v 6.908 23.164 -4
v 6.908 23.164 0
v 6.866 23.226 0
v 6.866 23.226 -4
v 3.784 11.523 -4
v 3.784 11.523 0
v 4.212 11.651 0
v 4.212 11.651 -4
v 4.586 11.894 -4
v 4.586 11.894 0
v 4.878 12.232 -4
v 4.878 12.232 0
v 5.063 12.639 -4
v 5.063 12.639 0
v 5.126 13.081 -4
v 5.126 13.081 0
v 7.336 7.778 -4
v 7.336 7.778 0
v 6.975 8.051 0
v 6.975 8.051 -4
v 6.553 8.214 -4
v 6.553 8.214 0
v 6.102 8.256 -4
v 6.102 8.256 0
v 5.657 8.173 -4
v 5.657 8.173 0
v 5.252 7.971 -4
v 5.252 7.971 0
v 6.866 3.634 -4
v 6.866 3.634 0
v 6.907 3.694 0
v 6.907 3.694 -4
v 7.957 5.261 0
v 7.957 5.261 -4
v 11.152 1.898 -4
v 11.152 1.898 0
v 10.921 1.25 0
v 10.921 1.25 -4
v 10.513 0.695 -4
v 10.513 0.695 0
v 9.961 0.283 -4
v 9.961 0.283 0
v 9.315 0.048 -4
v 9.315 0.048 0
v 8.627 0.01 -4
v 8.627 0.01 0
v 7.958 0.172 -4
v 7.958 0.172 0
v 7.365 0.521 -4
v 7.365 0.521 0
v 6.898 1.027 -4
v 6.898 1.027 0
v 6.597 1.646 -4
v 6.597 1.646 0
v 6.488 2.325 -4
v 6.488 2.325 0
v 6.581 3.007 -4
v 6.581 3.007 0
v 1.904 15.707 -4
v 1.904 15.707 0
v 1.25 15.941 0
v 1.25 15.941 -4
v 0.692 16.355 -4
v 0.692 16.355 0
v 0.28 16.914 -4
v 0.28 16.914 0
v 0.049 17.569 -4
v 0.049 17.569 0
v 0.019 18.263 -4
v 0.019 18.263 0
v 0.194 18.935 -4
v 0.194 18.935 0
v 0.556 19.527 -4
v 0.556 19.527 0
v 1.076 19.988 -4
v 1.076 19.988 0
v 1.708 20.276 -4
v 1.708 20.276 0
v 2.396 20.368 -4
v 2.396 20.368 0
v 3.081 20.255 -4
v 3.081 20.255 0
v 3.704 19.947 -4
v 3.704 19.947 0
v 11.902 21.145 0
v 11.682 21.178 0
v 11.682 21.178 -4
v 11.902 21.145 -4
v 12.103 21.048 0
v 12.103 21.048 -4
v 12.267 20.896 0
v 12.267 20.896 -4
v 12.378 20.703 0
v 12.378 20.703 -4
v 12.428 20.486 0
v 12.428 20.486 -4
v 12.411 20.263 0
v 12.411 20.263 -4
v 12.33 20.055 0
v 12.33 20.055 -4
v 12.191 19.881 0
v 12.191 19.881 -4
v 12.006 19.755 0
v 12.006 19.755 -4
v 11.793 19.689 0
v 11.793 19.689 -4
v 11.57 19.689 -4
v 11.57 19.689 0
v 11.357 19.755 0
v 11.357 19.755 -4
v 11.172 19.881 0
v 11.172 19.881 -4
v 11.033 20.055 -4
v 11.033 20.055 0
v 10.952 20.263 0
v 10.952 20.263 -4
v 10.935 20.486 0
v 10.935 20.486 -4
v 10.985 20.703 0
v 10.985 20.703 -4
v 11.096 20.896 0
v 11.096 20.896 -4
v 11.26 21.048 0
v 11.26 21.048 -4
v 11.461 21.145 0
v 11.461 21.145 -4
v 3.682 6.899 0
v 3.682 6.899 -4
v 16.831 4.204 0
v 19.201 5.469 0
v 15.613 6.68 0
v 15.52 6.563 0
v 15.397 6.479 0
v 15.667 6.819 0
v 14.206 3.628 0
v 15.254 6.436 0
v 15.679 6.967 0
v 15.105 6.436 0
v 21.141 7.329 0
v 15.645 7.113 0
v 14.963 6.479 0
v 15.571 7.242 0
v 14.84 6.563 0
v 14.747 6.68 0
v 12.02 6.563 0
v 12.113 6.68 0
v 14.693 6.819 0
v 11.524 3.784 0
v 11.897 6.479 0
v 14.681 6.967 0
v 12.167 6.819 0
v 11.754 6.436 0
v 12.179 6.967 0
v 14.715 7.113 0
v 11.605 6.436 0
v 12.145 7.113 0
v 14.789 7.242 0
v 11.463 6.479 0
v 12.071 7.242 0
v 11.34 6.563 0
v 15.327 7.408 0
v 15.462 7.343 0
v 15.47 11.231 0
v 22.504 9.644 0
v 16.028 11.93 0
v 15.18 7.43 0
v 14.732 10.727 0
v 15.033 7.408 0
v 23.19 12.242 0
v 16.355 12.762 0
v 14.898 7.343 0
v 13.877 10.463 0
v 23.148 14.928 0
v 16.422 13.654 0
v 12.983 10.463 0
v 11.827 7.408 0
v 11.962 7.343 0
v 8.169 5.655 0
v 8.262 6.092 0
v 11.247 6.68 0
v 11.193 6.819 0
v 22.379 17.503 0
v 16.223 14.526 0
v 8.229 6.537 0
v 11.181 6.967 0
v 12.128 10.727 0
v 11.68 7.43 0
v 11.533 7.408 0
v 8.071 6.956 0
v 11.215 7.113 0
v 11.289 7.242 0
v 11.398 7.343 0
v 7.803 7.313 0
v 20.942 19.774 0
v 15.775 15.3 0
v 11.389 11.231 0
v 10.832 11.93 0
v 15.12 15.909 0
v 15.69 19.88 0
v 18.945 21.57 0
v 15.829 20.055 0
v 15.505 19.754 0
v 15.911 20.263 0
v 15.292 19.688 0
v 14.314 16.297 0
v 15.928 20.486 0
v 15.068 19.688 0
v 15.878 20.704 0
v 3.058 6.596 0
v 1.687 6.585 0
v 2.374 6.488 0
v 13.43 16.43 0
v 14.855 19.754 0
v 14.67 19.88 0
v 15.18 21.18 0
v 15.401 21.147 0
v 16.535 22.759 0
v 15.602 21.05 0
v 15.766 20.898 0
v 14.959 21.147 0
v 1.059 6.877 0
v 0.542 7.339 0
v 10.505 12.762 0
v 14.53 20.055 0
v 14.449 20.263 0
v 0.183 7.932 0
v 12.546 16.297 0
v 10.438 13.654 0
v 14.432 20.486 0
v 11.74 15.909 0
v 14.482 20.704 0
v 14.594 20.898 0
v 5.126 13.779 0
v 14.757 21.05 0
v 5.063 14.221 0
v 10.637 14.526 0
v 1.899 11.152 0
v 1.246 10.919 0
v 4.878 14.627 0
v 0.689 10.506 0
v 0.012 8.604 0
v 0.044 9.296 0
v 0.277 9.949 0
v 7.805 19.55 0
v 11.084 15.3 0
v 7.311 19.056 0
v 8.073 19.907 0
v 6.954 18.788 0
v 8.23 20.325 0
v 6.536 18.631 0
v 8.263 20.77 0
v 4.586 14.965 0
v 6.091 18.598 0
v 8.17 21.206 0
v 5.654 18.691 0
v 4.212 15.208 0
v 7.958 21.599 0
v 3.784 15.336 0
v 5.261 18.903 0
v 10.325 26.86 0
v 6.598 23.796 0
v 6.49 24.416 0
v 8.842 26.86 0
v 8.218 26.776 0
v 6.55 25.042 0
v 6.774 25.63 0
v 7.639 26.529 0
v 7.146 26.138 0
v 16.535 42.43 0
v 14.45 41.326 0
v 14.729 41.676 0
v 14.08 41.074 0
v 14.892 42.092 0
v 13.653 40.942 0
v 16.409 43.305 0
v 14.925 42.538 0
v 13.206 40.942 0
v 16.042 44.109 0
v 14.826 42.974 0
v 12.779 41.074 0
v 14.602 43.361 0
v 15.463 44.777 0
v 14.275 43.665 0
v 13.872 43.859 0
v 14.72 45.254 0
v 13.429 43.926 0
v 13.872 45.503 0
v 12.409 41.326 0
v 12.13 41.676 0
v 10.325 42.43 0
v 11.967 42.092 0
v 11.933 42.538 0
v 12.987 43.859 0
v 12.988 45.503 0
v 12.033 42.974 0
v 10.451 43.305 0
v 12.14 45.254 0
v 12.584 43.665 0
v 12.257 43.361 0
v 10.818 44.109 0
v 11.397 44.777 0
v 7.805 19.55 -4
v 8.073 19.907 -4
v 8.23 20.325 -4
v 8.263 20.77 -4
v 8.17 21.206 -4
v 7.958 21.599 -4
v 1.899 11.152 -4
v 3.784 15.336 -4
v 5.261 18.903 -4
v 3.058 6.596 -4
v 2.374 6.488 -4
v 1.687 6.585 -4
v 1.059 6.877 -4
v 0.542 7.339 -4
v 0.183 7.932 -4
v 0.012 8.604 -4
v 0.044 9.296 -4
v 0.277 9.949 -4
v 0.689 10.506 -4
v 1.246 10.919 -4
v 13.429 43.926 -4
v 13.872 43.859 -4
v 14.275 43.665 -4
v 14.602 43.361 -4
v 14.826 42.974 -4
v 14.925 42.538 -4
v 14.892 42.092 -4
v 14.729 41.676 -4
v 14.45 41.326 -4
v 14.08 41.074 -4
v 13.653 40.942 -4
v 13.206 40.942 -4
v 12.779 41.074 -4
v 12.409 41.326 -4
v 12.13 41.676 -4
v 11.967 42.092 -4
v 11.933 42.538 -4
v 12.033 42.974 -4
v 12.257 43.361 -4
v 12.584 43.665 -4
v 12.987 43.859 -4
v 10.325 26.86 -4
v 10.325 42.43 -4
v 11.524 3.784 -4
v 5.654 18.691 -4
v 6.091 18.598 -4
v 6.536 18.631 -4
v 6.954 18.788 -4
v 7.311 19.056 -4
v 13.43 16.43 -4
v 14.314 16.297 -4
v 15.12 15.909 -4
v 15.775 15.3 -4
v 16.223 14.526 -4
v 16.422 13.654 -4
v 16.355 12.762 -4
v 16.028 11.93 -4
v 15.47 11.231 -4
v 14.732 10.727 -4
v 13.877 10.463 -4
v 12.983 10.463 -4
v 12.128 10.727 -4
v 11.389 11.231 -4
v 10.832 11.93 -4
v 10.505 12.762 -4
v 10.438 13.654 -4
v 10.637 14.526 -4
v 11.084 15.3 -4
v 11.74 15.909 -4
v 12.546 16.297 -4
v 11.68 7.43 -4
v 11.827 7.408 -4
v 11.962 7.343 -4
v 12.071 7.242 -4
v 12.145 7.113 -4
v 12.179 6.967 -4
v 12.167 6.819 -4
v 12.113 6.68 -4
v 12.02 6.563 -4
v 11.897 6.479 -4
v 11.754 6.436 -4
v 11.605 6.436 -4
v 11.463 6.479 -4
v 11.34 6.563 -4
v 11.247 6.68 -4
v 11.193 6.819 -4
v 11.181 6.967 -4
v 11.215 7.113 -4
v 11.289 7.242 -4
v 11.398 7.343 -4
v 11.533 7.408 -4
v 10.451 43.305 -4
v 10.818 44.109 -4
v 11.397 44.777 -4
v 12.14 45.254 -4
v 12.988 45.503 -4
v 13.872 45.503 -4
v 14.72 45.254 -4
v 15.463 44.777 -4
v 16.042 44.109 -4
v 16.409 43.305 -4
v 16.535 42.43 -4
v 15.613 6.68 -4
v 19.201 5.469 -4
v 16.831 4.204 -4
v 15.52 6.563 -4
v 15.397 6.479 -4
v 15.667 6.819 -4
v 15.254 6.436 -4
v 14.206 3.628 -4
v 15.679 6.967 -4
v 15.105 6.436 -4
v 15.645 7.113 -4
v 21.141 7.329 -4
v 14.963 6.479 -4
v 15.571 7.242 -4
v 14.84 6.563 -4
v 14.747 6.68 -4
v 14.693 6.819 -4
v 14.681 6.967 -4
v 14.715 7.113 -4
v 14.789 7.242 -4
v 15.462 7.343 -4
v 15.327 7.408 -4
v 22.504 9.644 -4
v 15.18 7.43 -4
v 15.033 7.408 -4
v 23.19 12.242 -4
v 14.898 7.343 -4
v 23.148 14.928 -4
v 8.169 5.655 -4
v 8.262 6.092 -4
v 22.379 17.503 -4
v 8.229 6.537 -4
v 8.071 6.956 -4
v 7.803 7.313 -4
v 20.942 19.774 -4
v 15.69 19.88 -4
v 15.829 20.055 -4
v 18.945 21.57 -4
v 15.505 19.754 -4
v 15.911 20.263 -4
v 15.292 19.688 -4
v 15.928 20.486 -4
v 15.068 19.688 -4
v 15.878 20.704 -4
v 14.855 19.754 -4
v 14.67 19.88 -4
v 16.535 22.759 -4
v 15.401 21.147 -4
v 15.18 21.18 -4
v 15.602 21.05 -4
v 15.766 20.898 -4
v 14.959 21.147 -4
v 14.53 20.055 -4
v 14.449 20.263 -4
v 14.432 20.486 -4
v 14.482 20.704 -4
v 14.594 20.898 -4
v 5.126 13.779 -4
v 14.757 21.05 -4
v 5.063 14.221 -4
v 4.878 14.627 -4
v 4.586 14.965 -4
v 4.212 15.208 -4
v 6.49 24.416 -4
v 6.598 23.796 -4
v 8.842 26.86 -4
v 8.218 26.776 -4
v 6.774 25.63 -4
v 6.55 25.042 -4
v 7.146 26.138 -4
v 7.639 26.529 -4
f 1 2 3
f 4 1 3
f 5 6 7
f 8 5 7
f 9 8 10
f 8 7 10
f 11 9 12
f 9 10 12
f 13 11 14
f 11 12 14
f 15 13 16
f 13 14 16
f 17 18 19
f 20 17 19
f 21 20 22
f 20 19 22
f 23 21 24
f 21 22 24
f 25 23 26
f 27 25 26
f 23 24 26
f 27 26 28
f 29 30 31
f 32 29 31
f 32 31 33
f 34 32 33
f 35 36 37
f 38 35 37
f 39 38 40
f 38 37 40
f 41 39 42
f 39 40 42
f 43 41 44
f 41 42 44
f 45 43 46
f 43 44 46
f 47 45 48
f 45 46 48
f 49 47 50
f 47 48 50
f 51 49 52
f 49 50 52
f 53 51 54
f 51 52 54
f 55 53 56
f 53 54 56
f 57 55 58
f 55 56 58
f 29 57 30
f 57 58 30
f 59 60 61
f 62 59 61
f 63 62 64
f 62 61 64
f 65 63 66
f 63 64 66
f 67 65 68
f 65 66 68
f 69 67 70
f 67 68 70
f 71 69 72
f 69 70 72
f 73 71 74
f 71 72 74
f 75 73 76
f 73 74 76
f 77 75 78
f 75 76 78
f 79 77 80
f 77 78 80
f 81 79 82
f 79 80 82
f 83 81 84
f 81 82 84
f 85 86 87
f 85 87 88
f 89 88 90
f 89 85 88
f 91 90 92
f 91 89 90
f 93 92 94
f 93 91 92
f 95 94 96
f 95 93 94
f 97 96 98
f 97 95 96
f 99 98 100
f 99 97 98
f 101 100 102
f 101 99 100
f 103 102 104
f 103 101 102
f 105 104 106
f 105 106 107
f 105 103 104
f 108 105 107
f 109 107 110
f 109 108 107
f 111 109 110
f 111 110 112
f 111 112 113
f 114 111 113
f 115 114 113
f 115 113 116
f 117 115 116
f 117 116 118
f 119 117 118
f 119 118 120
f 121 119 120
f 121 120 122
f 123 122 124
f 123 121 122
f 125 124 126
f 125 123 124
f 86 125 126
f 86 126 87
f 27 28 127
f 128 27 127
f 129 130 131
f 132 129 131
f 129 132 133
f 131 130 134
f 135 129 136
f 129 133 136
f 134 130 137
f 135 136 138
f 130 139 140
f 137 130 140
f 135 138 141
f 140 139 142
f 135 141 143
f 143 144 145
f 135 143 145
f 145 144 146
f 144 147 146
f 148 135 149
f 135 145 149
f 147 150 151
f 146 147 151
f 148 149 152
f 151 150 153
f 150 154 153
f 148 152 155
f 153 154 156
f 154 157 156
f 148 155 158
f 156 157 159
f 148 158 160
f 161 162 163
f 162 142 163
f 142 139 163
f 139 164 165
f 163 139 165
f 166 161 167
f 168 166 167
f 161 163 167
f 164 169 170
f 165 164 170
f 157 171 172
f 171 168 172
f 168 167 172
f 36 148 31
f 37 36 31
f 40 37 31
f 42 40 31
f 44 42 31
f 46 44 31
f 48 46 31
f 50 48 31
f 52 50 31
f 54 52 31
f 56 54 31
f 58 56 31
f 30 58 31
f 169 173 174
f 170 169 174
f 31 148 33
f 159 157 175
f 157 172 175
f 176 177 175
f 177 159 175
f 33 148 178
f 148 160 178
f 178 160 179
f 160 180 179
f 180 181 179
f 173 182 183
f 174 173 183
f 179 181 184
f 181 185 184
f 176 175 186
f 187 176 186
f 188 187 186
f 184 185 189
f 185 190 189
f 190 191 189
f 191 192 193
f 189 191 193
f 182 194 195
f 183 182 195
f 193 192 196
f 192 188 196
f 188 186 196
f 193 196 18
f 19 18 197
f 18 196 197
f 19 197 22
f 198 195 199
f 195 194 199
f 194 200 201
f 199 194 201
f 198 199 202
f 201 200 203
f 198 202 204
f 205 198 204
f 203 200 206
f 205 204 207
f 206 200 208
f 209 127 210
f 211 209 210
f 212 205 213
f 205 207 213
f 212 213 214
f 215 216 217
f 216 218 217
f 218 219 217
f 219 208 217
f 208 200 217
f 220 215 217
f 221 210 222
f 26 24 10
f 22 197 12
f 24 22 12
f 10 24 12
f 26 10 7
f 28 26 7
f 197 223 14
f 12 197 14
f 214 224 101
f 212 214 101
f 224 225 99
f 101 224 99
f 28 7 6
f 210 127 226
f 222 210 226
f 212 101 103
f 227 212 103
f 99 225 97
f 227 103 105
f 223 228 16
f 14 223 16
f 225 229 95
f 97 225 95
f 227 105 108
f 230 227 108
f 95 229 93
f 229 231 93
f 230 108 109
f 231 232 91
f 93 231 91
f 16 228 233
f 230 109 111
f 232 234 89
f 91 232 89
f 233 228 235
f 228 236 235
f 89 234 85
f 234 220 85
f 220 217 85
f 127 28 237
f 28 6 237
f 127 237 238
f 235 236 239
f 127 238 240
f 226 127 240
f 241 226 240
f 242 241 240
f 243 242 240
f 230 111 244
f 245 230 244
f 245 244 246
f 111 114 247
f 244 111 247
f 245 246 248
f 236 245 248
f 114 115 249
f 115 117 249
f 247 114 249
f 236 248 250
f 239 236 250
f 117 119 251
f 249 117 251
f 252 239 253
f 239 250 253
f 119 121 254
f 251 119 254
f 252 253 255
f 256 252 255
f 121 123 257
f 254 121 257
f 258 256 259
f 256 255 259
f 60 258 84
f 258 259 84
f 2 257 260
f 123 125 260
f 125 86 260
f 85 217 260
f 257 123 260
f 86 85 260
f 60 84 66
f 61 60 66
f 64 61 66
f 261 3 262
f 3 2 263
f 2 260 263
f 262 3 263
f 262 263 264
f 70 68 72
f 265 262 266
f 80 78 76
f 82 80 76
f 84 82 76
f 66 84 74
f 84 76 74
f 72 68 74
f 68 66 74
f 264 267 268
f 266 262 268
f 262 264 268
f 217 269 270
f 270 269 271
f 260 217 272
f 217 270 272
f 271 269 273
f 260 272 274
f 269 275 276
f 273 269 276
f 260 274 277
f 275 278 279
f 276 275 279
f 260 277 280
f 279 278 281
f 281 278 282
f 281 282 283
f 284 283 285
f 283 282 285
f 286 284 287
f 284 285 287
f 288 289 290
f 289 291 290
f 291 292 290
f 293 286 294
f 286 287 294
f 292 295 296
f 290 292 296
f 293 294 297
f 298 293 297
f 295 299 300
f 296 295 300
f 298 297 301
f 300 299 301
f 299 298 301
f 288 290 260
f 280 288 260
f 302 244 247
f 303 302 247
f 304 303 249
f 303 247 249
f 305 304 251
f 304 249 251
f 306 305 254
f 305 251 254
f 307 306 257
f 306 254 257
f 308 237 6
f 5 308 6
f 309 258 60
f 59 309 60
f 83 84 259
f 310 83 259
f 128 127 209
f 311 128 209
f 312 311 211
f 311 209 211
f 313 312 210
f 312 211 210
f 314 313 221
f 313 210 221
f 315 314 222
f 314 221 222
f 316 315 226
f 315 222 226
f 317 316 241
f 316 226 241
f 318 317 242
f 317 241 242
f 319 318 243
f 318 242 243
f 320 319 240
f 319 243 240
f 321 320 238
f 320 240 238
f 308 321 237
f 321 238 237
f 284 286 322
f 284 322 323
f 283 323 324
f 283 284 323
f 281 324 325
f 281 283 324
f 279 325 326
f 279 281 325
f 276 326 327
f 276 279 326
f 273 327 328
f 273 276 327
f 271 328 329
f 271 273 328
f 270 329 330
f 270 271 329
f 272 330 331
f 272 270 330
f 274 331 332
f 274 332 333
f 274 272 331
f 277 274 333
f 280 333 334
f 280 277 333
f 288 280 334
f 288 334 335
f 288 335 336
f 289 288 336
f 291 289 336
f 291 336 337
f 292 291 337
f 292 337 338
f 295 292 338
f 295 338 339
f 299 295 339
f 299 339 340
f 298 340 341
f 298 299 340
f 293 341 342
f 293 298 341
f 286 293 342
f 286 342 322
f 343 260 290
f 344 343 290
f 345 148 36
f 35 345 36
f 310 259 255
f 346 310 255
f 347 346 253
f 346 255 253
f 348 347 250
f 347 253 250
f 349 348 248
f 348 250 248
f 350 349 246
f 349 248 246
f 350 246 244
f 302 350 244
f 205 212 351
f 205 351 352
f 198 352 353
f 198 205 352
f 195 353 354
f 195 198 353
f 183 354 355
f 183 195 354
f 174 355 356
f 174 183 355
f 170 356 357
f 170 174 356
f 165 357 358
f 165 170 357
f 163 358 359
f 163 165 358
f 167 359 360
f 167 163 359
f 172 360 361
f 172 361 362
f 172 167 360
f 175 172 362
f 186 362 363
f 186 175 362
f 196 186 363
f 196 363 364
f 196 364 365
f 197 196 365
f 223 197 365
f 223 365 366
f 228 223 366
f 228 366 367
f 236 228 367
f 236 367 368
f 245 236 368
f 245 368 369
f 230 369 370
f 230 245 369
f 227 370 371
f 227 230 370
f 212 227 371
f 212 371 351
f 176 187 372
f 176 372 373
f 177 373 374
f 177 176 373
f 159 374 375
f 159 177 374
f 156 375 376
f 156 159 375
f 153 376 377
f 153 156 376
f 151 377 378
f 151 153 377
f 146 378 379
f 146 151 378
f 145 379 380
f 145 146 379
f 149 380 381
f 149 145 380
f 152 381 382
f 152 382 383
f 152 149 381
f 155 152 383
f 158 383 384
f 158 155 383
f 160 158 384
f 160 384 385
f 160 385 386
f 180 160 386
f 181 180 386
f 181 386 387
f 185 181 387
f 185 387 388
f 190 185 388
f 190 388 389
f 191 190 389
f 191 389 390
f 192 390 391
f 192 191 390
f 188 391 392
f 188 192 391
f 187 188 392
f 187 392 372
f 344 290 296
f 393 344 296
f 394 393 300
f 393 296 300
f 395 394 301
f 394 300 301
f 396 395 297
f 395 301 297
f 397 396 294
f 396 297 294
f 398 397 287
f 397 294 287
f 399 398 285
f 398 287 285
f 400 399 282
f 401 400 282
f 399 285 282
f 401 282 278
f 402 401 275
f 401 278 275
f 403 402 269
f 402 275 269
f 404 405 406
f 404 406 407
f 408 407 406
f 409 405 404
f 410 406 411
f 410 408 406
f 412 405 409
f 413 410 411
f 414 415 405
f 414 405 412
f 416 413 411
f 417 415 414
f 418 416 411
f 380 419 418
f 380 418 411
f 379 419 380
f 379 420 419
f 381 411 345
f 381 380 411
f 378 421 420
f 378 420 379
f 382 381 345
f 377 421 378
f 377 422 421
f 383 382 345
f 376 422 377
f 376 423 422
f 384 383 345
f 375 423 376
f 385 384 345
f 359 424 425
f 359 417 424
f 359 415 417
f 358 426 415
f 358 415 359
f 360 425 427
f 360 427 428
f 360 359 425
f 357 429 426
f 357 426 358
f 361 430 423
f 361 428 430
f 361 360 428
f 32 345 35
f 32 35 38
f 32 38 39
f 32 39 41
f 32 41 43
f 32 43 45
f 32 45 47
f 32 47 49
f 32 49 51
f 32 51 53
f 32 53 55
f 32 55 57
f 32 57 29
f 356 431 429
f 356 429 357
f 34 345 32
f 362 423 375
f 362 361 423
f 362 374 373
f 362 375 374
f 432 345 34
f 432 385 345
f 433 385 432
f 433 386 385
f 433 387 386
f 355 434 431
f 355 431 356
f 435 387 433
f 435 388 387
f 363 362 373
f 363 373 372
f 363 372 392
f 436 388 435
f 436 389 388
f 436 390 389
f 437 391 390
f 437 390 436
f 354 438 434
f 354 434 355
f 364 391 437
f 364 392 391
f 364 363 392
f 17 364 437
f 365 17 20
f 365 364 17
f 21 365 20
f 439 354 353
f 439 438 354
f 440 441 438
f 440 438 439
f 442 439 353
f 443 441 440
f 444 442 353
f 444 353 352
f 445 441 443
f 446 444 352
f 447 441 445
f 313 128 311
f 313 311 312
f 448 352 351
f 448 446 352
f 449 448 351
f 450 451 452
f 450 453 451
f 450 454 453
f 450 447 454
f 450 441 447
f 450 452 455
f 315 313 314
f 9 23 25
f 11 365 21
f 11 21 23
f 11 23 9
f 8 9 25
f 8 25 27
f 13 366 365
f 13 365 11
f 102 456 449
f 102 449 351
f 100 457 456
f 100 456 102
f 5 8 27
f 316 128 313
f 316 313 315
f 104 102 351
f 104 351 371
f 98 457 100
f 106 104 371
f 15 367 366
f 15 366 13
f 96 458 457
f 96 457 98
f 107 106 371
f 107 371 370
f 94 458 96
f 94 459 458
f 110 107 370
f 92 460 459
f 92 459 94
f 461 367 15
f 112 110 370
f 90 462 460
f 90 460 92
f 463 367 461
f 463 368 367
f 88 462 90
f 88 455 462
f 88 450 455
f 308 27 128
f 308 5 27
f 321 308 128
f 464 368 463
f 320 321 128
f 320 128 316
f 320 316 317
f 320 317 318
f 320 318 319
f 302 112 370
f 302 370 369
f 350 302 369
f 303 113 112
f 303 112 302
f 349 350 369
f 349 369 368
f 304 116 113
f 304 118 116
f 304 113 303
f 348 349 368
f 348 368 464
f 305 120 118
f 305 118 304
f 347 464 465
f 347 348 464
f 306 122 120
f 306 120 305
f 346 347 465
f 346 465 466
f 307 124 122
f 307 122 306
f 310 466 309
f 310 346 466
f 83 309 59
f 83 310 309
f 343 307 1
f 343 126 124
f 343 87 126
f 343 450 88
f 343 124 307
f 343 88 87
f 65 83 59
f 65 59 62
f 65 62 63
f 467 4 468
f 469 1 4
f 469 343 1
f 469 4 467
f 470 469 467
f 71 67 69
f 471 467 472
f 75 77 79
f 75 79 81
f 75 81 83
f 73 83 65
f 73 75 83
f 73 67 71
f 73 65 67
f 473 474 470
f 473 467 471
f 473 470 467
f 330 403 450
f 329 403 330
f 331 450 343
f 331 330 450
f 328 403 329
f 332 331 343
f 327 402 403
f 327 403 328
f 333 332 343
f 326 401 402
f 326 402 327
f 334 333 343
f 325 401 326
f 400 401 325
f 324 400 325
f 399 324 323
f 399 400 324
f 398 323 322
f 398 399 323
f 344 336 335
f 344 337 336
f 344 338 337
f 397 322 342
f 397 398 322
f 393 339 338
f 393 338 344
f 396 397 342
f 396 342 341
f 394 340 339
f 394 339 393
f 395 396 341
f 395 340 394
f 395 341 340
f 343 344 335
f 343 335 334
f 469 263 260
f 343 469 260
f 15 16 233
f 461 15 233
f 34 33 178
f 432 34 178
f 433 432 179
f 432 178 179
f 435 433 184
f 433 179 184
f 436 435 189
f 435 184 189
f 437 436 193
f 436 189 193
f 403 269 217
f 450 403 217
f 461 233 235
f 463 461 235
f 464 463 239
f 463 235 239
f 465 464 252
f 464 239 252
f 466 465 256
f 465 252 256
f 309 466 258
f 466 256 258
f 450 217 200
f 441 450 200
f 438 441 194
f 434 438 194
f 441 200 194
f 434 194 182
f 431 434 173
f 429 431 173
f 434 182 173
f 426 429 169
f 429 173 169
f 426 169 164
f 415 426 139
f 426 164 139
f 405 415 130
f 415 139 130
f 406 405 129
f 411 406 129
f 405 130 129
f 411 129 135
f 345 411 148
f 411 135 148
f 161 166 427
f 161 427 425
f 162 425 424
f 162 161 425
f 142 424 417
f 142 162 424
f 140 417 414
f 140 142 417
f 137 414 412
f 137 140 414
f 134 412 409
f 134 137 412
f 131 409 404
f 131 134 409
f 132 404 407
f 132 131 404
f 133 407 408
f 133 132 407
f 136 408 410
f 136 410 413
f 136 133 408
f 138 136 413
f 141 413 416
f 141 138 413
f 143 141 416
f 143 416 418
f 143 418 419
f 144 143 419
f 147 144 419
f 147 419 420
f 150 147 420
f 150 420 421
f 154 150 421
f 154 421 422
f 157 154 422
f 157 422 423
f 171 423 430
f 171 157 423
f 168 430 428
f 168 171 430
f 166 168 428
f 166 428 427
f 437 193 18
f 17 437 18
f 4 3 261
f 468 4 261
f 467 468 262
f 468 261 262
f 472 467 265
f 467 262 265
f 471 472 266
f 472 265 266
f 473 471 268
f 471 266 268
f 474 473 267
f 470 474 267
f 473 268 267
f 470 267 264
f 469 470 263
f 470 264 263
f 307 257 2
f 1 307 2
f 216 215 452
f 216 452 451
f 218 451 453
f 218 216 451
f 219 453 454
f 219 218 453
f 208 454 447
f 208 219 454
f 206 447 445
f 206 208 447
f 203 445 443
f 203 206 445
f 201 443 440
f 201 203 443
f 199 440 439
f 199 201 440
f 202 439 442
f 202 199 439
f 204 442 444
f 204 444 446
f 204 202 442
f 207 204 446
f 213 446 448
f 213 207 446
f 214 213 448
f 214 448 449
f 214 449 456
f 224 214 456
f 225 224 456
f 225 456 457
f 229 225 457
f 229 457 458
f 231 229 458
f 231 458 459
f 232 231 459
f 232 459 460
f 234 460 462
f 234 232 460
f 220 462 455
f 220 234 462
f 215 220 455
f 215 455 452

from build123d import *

# Parameters (mm, degrees)
SKETCH1_R           = 0.499999685
SKETCH1_R_2         = 0.499999936
SKETCH1_R_3         = 3.000000209
SKETCH1_R_4         = 0.750000452
SKETCH1_R_5         = 0.748506913
SKETCH1_R_6         = 1.500187581
BOSS_EXTRUDE1_DEPTH = 4


# Read off the part's stored shape, not the designer's step: Imported1
with BuildPart() as part:
    # Sketch1 → Boss-Extrude1 (new body)
    with BuildSketch(Plane(origin=(0, 0, 0), x_dir=(-1, 0, 0), z_dir=(0, 0, -1))):
        with BuildLine():
            ThreePointArc((-10.3249643, 42.429967422), (-13.429964129, 45.534967549), (-16.534963959, 42.429967422))
            Line((-16.534963959, 42.429967422), (-16.534963959, 22.759328173))
            ThreePointArc((-16.534963959, 22.759328173), (-22.936546798, 10.91939696), (-11.523821193, 3.783997304))
            Line((-11.523821193, 3.783997304), (-11.151510993, 1.898050354))
            ThreePointArc((-11.151510993, 1.898050354), (-7.958448418, 0.172164331), (-6.866399752, 3.633632355))
            Line((-6.866399752, 3.633632355), (-6.907151039, 3.694454964))
            Line((-6.907151039, 3.694454964), (-7.95702579, 5.261426867))
            ThreePointArc((-7.95702579, 5.261426867), (-8.261161621, 6.315782715), (-7.802888126, 7.312853556))
            Line((-7.802888126, 7.312853556), (-7.336401059, 7.778170532))
            ThreePointArc((-7.336401059, 7.778170532), (-6.328947455, 8.250313315), (-5.25191043, 7.971256294))
            Line((-5.25191043, 7.971256294), (-3.681946925, 6.898545358))
            ThreePointArc((-3.681946925, 6.898545358), (-0.18308636, 7.931946592), (-1.898741108, 11.151647221))
            Line((-1.898741108, 11.151647221), (-3.784109013, 11.52325713))
            ThreePointArc((-3.784109013, 11.52325713), (-4.744145314, 12.052872295), (-5.125871494, 13.080708395))
            Line((-5.125871494, 13.080708395), (-5.125914366, 13.778599746))
            Line((-5.125914366, 13.778599746), (-5.125914378, 13.778793202))
            ThreePointArc((-5.125914378, 13.778793202), (-4.744155373, 14.806645767), (-3.783994211, 15.336090171))
            Line((-3.783994211, 15.336090171), (-1.90356186, 15.70732102))
            ThreePointArc((-1.90356186, 15.70732102), (-0.193583134, 18.935202355), (-3.703637126, 19.946521356))
            Line((-3.703637126, 19.946521356), (-5.261386695, 18.902842274))
            ThreePointArc((-5.261386695, 18.902842274), (-6.314757765, 18.59870429), (-7.311417899, 19.055605922))
            Line((-7.311417899, 19.055605922), (-7.805450119, 19.549549653))
            ThreePointArc((-7.805450119, 19.549549653), (-8.262234293, 20.54598288), (-7.957754629, 21.598989571))
            Line((-7.957754629, 21.598989571), (-6.908352, 23.163741071))
            Line((-6.908352, 23.163741071), (-6.866399752, 23.226295558))
            ThreePointArc((-6.866399752, 23.226295558), (-6.774111326, 25.630427698), (-8.842129144, 26.859927922))
            Line((-8.842129144, 26.859927922), (-10.3249643, 26.859927922))
            Line((-10.3249643, 26.859927922), (-10.3249643, 42.429967422))
        make_face()
        with Locations(Location((-15.179963978, 6.929964102, 0), (0, 0, 90))):
            Circle(SKETCH1_R, mode=Mode.SUBTRACT)
        with Locations(Location((-11.679964298, 6.929964382, 0), (0, 0, 90))):
            Circle(SKETCH1_R_2, mode=Mode.SUBTRACT)
        with Locations(Location((-13.42996461, 13.429962781, 0), (0, 0, 90))):
            Circle(SKETCH1_R_3, mode=Mode.SUBTRACT)
        with Locations(Location((-15.179964076, 20.429963954, 0), (0, 0, 90))):
            Circle(SKETCH1_R_4, mode=Mode.SUBTRACT)
        with Locations(Location((-11.681540167, 20.429629577, 0), (0, 0, 90))):
            Circle(SKETCH1_R_5, mode=Mode.SUBTRACT)
        with Locations(Location((-13.429420254, 42.425723706, 0), (0, 0, 90))):
            Circle(SKETCH1_R_6, mode=Mode.SUBTRACT)
    extrude(amount=BOSS_EXTRUDE1_DEPTH)


solid = part.part
